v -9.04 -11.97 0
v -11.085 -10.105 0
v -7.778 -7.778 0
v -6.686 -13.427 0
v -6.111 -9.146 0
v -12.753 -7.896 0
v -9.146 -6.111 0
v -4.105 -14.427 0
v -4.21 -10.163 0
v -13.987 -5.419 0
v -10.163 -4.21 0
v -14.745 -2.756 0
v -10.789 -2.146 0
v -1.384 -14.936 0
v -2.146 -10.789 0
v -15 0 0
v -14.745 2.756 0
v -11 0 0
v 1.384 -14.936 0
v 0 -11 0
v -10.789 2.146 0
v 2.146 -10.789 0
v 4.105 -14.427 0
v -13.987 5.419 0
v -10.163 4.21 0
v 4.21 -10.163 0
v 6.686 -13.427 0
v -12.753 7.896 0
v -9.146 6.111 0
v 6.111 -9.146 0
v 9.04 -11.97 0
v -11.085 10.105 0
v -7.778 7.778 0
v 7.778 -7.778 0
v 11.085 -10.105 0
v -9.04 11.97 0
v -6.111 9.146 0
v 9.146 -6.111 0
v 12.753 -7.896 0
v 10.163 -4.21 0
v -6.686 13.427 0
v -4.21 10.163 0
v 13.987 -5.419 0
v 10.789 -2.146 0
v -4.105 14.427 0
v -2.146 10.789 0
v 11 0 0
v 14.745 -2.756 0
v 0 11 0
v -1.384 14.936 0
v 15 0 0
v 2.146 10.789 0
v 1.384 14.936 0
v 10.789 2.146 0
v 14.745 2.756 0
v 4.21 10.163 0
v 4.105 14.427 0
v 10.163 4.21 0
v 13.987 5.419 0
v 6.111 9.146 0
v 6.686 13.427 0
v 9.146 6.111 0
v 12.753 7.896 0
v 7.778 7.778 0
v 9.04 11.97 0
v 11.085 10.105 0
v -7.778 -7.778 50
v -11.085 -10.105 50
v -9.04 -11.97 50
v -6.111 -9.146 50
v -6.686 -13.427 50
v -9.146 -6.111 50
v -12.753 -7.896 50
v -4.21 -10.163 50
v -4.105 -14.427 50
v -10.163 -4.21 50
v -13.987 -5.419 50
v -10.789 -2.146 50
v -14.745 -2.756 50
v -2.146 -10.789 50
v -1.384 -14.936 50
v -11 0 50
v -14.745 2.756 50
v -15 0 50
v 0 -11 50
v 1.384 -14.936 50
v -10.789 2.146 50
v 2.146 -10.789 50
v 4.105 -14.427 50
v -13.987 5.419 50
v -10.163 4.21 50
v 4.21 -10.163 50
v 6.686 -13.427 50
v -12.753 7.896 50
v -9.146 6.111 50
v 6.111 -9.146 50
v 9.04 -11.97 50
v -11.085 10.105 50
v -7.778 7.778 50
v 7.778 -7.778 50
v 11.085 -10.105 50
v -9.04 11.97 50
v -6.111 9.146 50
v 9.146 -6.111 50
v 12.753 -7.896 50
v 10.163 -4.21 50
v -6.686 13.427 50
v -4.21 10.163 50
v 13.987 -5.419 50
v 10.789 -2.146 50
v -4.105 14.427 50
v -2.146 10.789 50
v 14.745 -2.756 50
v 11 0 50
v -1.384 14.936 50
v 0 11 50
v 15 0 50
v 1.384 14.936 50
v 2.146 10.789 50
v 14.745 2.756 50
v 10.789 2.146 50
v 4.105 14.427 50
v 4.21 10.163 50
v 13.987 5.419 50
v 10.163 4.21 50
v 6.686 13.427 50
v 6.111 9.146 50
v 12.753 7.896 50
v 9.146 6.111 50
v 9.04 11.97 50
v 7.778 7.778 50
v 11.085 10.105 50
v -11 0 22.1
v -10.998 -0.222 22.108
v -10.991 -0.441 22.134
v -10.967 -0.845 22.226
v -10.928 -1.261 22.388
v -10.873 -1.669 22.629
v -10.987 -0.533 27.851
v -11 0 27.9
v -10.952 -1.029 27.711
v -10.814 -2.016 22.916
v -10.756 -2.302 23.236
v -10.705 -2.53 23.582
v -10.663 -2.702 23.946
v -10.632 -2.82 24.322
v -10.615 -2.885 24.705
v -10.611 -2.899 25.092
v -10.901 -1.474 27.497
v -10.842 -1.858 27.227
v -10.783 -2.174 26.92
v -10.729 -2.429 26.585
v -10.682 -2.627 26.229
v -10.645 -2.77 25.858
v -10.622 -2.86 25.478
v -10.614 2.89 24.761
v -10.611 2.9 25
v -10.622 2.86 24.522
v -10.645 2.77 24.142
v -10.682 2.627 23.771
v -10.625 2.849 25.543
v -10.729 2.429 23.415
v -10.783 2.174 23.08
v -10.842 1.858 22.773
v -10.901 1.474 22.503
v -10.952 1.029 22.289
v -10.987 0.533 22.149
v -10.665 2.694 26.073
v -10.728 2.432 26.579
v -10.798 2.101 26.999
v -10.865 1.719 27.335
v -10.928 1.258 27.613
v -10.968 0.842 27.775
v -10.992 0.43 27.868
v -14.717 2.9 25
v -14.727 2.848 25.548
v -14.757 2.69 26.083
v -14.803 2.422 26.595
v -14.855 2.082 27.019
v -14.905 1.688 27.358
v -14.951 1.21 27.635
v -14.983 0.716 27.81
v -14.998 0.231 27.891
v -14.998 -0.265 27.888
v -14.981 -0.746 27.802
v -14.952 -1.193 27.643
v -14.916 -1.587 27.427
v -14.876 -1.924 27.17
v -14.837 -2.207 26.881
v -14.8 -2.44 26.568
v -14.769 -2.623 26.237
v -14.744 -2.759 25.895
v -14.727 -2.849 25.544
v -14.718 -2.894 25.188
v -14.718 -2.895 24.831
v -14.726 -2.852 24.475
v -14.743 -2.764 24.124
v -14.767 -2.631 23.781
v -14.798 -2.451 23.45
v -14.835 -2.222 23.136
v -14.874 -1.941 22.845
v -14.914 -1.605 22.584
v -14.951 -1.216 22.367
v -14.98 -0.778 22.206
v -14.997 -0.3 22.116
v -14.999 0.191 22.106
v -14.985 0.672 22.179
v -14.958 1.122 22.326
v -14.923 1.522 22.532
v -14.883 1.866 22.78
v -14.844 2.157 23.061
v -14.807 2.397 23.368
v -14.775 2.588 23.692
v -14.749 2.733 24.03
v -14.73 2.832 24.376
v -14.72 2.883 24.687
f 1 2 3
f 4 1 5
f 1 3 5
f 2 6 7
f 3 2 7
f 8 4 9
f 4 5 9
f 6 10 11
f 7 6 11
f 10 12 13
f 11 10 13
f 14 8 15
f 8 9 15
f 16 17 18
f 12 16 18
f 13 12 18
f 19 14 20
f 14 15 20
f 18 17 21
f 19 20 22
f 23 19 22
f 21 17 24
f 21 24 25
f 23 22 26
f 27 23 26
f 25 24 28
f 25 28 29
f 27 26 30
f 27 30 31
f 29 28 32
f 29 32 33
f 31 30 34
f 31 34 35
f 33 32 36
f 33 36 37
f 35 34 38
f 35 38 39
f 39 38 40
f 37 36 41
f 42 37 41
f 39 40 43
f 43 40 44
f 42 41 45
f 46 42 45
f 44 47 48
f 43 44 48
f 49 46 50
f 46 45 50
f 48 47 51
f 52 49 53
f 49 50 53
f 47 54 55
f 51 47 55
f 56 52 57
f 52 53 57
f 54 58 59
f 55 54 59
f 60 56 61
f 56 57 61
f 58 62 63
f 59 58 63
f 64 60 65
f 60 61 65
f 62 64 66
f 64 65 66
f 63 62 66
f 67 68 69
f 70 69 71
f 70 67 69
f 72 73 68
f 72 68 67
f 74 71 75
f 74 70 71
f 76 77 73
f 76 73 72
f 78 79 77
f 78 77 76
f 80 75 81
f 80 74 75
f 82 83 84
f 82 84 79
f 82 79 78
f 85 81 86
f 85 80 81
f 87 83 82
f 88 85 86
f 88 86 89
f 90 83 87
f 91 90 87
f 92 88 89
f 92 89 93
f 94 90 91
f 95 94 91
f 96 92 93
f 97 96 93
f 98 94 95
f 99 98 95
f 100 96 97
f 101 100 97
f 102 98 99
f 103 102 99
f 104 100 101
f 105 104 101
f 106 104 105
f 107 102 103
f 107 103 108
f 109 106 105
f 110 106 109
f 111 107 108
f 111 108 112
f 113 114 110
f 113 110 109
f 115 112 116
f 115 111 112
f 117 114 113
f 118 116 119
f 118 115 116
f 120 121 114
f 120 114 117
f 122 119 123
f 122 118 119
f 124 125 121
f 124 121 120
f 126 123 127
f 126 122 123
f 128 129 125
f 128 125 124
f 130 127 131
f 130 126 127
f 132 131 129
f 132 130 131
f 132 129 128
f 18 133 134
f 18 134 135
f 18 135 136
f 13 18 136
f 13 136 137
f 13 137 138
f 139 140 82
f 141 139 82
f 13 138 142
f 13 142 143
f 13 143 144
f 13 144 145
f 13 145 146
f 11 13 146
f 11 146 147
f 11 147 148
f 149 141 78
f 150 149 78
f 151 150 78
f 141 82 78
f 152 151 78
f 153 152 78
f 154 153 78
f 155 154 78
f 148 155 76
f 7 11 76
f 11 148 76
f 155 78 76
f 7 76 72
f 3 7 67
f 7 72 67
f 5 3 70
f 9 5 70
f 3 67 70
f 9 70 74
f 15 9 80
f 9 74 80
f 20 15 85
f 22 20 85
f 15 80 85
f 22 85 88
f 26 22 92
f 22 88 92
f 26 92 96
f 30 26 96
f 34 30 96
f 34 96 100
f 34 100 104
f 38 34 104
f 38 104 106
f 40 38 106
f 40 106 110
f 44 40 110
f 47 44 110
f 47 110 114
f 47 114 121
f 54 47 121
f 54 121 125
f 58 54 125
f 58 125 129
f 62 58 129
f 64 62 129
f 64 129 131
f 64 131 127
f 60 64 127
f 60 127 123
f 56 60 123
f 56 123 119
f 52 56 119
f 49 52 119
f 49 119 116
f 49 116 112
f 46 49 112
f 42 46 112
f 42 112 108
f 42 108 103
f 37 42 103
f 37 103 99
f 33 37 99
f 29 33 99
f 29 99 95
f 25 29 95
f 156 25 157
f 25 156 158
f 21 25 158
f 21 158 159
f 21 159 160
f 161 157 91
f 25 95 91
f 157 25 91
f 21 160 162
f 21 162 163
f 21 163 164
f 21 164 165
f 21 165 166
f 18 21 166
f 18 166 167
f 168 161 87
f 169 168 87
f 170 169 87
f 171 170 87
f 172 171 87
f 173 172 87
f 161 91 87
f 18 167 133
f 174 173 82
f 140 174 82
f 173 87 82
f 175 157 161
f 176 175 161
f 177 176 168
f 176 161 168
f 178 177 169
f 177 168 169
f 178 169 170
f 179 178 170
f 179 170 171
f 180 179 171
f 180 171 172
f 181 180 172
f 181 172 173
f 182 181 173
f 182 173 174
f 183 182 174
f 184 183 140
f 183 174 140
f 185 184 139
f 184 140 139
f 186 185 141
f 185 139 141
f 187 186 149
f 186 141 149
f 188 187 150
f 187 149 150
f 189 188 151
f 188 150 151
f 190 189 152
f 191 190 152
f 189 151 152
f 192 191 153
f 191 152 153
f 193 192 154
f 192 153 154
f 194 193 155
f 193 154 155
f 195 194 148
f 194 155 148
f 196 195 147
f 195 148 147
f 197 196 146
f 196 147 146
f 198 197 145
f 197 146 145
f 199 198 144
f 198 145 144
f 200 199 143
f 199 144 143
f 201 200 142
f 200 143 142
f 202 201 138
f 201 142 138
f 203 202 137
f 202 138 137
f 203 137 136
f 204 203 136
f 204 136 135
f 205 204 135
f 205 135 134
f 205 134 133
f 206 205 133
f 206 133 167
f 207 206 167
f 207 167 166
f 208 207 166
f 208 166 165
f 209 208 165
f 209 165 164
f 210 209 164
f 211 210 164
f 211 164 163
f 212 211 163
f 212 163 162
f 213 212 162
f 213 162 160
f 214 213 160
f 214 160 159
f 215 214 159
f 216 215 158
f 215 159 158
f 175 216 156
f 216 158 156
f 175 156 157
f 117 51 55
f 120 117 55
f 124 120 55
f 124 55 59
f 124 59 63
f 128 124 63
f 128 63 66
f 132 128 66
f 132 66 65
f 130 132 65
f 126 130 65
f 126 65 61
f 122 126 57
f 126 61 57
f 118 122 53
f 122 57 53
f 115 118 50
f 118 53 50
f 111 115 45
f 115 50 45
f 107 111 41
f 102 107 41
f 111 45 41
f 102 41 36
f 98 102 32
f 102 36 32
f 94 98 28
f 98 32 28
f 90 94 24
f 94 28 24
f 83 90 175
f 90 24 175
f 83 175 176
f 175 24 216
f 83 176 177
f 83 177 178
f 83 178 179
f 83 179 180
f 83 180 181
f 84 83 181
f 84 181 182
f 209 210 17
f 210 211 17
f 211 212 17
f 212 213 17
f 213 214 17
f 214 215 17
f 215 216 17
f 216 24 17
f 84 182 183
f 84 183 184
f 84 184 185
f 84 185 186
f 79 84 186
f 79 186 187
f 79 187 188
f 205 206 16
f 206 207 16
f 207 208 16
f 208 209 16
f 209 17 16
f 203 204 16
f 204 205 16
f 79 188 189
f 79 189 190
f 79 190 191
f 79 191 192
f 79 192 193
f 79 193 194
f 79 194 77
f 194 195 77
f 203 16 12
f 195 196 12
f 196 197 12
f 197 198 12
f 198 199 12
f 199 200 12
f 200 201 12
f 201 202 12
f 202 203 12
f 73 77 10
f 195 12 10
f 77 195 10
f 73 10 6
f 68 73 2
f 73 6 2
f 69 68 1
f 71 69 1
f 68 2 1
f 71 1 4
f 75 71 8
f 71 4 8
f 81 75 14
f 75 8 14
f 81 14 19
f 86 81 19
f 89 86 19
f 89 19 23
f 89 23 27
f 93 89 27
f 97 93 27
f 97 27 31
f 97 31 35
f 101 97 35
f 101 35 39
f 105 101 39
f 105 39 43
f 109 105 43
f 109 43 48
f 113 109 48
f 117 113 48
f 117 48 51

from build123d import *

# Parameters (mm, degrees)
F0_R     = 15
F1_DEPTH = 50
F2_D     = 22
F4_D     = 5.8
F4_DEPTH = 15.001


with BuildPart() as f1:
    # F0 (on Top) → F1 (new body)
    with BuildSketch(Plane.XY):
        Circle(F0_R)
    extrude(amount=F1_DEPTH)

    # F2 (through all)
    with Locations(Plane(origin=(0, 0, 0), x_dir=(1, 0, 0), z_dir=(0, 0, -1))):
        with Locations((0, 0)):
            Hole(F2_D / 2)

    # F4 (through all, one way)
    with BuildSketch(Plane.YZ):
        with Locations((0, 25)):
            Circle(F4_D / 2)
    extrude(amount=-F4_DEPTH, mode=Mode.SUBTRACT)


solid = f1.part
